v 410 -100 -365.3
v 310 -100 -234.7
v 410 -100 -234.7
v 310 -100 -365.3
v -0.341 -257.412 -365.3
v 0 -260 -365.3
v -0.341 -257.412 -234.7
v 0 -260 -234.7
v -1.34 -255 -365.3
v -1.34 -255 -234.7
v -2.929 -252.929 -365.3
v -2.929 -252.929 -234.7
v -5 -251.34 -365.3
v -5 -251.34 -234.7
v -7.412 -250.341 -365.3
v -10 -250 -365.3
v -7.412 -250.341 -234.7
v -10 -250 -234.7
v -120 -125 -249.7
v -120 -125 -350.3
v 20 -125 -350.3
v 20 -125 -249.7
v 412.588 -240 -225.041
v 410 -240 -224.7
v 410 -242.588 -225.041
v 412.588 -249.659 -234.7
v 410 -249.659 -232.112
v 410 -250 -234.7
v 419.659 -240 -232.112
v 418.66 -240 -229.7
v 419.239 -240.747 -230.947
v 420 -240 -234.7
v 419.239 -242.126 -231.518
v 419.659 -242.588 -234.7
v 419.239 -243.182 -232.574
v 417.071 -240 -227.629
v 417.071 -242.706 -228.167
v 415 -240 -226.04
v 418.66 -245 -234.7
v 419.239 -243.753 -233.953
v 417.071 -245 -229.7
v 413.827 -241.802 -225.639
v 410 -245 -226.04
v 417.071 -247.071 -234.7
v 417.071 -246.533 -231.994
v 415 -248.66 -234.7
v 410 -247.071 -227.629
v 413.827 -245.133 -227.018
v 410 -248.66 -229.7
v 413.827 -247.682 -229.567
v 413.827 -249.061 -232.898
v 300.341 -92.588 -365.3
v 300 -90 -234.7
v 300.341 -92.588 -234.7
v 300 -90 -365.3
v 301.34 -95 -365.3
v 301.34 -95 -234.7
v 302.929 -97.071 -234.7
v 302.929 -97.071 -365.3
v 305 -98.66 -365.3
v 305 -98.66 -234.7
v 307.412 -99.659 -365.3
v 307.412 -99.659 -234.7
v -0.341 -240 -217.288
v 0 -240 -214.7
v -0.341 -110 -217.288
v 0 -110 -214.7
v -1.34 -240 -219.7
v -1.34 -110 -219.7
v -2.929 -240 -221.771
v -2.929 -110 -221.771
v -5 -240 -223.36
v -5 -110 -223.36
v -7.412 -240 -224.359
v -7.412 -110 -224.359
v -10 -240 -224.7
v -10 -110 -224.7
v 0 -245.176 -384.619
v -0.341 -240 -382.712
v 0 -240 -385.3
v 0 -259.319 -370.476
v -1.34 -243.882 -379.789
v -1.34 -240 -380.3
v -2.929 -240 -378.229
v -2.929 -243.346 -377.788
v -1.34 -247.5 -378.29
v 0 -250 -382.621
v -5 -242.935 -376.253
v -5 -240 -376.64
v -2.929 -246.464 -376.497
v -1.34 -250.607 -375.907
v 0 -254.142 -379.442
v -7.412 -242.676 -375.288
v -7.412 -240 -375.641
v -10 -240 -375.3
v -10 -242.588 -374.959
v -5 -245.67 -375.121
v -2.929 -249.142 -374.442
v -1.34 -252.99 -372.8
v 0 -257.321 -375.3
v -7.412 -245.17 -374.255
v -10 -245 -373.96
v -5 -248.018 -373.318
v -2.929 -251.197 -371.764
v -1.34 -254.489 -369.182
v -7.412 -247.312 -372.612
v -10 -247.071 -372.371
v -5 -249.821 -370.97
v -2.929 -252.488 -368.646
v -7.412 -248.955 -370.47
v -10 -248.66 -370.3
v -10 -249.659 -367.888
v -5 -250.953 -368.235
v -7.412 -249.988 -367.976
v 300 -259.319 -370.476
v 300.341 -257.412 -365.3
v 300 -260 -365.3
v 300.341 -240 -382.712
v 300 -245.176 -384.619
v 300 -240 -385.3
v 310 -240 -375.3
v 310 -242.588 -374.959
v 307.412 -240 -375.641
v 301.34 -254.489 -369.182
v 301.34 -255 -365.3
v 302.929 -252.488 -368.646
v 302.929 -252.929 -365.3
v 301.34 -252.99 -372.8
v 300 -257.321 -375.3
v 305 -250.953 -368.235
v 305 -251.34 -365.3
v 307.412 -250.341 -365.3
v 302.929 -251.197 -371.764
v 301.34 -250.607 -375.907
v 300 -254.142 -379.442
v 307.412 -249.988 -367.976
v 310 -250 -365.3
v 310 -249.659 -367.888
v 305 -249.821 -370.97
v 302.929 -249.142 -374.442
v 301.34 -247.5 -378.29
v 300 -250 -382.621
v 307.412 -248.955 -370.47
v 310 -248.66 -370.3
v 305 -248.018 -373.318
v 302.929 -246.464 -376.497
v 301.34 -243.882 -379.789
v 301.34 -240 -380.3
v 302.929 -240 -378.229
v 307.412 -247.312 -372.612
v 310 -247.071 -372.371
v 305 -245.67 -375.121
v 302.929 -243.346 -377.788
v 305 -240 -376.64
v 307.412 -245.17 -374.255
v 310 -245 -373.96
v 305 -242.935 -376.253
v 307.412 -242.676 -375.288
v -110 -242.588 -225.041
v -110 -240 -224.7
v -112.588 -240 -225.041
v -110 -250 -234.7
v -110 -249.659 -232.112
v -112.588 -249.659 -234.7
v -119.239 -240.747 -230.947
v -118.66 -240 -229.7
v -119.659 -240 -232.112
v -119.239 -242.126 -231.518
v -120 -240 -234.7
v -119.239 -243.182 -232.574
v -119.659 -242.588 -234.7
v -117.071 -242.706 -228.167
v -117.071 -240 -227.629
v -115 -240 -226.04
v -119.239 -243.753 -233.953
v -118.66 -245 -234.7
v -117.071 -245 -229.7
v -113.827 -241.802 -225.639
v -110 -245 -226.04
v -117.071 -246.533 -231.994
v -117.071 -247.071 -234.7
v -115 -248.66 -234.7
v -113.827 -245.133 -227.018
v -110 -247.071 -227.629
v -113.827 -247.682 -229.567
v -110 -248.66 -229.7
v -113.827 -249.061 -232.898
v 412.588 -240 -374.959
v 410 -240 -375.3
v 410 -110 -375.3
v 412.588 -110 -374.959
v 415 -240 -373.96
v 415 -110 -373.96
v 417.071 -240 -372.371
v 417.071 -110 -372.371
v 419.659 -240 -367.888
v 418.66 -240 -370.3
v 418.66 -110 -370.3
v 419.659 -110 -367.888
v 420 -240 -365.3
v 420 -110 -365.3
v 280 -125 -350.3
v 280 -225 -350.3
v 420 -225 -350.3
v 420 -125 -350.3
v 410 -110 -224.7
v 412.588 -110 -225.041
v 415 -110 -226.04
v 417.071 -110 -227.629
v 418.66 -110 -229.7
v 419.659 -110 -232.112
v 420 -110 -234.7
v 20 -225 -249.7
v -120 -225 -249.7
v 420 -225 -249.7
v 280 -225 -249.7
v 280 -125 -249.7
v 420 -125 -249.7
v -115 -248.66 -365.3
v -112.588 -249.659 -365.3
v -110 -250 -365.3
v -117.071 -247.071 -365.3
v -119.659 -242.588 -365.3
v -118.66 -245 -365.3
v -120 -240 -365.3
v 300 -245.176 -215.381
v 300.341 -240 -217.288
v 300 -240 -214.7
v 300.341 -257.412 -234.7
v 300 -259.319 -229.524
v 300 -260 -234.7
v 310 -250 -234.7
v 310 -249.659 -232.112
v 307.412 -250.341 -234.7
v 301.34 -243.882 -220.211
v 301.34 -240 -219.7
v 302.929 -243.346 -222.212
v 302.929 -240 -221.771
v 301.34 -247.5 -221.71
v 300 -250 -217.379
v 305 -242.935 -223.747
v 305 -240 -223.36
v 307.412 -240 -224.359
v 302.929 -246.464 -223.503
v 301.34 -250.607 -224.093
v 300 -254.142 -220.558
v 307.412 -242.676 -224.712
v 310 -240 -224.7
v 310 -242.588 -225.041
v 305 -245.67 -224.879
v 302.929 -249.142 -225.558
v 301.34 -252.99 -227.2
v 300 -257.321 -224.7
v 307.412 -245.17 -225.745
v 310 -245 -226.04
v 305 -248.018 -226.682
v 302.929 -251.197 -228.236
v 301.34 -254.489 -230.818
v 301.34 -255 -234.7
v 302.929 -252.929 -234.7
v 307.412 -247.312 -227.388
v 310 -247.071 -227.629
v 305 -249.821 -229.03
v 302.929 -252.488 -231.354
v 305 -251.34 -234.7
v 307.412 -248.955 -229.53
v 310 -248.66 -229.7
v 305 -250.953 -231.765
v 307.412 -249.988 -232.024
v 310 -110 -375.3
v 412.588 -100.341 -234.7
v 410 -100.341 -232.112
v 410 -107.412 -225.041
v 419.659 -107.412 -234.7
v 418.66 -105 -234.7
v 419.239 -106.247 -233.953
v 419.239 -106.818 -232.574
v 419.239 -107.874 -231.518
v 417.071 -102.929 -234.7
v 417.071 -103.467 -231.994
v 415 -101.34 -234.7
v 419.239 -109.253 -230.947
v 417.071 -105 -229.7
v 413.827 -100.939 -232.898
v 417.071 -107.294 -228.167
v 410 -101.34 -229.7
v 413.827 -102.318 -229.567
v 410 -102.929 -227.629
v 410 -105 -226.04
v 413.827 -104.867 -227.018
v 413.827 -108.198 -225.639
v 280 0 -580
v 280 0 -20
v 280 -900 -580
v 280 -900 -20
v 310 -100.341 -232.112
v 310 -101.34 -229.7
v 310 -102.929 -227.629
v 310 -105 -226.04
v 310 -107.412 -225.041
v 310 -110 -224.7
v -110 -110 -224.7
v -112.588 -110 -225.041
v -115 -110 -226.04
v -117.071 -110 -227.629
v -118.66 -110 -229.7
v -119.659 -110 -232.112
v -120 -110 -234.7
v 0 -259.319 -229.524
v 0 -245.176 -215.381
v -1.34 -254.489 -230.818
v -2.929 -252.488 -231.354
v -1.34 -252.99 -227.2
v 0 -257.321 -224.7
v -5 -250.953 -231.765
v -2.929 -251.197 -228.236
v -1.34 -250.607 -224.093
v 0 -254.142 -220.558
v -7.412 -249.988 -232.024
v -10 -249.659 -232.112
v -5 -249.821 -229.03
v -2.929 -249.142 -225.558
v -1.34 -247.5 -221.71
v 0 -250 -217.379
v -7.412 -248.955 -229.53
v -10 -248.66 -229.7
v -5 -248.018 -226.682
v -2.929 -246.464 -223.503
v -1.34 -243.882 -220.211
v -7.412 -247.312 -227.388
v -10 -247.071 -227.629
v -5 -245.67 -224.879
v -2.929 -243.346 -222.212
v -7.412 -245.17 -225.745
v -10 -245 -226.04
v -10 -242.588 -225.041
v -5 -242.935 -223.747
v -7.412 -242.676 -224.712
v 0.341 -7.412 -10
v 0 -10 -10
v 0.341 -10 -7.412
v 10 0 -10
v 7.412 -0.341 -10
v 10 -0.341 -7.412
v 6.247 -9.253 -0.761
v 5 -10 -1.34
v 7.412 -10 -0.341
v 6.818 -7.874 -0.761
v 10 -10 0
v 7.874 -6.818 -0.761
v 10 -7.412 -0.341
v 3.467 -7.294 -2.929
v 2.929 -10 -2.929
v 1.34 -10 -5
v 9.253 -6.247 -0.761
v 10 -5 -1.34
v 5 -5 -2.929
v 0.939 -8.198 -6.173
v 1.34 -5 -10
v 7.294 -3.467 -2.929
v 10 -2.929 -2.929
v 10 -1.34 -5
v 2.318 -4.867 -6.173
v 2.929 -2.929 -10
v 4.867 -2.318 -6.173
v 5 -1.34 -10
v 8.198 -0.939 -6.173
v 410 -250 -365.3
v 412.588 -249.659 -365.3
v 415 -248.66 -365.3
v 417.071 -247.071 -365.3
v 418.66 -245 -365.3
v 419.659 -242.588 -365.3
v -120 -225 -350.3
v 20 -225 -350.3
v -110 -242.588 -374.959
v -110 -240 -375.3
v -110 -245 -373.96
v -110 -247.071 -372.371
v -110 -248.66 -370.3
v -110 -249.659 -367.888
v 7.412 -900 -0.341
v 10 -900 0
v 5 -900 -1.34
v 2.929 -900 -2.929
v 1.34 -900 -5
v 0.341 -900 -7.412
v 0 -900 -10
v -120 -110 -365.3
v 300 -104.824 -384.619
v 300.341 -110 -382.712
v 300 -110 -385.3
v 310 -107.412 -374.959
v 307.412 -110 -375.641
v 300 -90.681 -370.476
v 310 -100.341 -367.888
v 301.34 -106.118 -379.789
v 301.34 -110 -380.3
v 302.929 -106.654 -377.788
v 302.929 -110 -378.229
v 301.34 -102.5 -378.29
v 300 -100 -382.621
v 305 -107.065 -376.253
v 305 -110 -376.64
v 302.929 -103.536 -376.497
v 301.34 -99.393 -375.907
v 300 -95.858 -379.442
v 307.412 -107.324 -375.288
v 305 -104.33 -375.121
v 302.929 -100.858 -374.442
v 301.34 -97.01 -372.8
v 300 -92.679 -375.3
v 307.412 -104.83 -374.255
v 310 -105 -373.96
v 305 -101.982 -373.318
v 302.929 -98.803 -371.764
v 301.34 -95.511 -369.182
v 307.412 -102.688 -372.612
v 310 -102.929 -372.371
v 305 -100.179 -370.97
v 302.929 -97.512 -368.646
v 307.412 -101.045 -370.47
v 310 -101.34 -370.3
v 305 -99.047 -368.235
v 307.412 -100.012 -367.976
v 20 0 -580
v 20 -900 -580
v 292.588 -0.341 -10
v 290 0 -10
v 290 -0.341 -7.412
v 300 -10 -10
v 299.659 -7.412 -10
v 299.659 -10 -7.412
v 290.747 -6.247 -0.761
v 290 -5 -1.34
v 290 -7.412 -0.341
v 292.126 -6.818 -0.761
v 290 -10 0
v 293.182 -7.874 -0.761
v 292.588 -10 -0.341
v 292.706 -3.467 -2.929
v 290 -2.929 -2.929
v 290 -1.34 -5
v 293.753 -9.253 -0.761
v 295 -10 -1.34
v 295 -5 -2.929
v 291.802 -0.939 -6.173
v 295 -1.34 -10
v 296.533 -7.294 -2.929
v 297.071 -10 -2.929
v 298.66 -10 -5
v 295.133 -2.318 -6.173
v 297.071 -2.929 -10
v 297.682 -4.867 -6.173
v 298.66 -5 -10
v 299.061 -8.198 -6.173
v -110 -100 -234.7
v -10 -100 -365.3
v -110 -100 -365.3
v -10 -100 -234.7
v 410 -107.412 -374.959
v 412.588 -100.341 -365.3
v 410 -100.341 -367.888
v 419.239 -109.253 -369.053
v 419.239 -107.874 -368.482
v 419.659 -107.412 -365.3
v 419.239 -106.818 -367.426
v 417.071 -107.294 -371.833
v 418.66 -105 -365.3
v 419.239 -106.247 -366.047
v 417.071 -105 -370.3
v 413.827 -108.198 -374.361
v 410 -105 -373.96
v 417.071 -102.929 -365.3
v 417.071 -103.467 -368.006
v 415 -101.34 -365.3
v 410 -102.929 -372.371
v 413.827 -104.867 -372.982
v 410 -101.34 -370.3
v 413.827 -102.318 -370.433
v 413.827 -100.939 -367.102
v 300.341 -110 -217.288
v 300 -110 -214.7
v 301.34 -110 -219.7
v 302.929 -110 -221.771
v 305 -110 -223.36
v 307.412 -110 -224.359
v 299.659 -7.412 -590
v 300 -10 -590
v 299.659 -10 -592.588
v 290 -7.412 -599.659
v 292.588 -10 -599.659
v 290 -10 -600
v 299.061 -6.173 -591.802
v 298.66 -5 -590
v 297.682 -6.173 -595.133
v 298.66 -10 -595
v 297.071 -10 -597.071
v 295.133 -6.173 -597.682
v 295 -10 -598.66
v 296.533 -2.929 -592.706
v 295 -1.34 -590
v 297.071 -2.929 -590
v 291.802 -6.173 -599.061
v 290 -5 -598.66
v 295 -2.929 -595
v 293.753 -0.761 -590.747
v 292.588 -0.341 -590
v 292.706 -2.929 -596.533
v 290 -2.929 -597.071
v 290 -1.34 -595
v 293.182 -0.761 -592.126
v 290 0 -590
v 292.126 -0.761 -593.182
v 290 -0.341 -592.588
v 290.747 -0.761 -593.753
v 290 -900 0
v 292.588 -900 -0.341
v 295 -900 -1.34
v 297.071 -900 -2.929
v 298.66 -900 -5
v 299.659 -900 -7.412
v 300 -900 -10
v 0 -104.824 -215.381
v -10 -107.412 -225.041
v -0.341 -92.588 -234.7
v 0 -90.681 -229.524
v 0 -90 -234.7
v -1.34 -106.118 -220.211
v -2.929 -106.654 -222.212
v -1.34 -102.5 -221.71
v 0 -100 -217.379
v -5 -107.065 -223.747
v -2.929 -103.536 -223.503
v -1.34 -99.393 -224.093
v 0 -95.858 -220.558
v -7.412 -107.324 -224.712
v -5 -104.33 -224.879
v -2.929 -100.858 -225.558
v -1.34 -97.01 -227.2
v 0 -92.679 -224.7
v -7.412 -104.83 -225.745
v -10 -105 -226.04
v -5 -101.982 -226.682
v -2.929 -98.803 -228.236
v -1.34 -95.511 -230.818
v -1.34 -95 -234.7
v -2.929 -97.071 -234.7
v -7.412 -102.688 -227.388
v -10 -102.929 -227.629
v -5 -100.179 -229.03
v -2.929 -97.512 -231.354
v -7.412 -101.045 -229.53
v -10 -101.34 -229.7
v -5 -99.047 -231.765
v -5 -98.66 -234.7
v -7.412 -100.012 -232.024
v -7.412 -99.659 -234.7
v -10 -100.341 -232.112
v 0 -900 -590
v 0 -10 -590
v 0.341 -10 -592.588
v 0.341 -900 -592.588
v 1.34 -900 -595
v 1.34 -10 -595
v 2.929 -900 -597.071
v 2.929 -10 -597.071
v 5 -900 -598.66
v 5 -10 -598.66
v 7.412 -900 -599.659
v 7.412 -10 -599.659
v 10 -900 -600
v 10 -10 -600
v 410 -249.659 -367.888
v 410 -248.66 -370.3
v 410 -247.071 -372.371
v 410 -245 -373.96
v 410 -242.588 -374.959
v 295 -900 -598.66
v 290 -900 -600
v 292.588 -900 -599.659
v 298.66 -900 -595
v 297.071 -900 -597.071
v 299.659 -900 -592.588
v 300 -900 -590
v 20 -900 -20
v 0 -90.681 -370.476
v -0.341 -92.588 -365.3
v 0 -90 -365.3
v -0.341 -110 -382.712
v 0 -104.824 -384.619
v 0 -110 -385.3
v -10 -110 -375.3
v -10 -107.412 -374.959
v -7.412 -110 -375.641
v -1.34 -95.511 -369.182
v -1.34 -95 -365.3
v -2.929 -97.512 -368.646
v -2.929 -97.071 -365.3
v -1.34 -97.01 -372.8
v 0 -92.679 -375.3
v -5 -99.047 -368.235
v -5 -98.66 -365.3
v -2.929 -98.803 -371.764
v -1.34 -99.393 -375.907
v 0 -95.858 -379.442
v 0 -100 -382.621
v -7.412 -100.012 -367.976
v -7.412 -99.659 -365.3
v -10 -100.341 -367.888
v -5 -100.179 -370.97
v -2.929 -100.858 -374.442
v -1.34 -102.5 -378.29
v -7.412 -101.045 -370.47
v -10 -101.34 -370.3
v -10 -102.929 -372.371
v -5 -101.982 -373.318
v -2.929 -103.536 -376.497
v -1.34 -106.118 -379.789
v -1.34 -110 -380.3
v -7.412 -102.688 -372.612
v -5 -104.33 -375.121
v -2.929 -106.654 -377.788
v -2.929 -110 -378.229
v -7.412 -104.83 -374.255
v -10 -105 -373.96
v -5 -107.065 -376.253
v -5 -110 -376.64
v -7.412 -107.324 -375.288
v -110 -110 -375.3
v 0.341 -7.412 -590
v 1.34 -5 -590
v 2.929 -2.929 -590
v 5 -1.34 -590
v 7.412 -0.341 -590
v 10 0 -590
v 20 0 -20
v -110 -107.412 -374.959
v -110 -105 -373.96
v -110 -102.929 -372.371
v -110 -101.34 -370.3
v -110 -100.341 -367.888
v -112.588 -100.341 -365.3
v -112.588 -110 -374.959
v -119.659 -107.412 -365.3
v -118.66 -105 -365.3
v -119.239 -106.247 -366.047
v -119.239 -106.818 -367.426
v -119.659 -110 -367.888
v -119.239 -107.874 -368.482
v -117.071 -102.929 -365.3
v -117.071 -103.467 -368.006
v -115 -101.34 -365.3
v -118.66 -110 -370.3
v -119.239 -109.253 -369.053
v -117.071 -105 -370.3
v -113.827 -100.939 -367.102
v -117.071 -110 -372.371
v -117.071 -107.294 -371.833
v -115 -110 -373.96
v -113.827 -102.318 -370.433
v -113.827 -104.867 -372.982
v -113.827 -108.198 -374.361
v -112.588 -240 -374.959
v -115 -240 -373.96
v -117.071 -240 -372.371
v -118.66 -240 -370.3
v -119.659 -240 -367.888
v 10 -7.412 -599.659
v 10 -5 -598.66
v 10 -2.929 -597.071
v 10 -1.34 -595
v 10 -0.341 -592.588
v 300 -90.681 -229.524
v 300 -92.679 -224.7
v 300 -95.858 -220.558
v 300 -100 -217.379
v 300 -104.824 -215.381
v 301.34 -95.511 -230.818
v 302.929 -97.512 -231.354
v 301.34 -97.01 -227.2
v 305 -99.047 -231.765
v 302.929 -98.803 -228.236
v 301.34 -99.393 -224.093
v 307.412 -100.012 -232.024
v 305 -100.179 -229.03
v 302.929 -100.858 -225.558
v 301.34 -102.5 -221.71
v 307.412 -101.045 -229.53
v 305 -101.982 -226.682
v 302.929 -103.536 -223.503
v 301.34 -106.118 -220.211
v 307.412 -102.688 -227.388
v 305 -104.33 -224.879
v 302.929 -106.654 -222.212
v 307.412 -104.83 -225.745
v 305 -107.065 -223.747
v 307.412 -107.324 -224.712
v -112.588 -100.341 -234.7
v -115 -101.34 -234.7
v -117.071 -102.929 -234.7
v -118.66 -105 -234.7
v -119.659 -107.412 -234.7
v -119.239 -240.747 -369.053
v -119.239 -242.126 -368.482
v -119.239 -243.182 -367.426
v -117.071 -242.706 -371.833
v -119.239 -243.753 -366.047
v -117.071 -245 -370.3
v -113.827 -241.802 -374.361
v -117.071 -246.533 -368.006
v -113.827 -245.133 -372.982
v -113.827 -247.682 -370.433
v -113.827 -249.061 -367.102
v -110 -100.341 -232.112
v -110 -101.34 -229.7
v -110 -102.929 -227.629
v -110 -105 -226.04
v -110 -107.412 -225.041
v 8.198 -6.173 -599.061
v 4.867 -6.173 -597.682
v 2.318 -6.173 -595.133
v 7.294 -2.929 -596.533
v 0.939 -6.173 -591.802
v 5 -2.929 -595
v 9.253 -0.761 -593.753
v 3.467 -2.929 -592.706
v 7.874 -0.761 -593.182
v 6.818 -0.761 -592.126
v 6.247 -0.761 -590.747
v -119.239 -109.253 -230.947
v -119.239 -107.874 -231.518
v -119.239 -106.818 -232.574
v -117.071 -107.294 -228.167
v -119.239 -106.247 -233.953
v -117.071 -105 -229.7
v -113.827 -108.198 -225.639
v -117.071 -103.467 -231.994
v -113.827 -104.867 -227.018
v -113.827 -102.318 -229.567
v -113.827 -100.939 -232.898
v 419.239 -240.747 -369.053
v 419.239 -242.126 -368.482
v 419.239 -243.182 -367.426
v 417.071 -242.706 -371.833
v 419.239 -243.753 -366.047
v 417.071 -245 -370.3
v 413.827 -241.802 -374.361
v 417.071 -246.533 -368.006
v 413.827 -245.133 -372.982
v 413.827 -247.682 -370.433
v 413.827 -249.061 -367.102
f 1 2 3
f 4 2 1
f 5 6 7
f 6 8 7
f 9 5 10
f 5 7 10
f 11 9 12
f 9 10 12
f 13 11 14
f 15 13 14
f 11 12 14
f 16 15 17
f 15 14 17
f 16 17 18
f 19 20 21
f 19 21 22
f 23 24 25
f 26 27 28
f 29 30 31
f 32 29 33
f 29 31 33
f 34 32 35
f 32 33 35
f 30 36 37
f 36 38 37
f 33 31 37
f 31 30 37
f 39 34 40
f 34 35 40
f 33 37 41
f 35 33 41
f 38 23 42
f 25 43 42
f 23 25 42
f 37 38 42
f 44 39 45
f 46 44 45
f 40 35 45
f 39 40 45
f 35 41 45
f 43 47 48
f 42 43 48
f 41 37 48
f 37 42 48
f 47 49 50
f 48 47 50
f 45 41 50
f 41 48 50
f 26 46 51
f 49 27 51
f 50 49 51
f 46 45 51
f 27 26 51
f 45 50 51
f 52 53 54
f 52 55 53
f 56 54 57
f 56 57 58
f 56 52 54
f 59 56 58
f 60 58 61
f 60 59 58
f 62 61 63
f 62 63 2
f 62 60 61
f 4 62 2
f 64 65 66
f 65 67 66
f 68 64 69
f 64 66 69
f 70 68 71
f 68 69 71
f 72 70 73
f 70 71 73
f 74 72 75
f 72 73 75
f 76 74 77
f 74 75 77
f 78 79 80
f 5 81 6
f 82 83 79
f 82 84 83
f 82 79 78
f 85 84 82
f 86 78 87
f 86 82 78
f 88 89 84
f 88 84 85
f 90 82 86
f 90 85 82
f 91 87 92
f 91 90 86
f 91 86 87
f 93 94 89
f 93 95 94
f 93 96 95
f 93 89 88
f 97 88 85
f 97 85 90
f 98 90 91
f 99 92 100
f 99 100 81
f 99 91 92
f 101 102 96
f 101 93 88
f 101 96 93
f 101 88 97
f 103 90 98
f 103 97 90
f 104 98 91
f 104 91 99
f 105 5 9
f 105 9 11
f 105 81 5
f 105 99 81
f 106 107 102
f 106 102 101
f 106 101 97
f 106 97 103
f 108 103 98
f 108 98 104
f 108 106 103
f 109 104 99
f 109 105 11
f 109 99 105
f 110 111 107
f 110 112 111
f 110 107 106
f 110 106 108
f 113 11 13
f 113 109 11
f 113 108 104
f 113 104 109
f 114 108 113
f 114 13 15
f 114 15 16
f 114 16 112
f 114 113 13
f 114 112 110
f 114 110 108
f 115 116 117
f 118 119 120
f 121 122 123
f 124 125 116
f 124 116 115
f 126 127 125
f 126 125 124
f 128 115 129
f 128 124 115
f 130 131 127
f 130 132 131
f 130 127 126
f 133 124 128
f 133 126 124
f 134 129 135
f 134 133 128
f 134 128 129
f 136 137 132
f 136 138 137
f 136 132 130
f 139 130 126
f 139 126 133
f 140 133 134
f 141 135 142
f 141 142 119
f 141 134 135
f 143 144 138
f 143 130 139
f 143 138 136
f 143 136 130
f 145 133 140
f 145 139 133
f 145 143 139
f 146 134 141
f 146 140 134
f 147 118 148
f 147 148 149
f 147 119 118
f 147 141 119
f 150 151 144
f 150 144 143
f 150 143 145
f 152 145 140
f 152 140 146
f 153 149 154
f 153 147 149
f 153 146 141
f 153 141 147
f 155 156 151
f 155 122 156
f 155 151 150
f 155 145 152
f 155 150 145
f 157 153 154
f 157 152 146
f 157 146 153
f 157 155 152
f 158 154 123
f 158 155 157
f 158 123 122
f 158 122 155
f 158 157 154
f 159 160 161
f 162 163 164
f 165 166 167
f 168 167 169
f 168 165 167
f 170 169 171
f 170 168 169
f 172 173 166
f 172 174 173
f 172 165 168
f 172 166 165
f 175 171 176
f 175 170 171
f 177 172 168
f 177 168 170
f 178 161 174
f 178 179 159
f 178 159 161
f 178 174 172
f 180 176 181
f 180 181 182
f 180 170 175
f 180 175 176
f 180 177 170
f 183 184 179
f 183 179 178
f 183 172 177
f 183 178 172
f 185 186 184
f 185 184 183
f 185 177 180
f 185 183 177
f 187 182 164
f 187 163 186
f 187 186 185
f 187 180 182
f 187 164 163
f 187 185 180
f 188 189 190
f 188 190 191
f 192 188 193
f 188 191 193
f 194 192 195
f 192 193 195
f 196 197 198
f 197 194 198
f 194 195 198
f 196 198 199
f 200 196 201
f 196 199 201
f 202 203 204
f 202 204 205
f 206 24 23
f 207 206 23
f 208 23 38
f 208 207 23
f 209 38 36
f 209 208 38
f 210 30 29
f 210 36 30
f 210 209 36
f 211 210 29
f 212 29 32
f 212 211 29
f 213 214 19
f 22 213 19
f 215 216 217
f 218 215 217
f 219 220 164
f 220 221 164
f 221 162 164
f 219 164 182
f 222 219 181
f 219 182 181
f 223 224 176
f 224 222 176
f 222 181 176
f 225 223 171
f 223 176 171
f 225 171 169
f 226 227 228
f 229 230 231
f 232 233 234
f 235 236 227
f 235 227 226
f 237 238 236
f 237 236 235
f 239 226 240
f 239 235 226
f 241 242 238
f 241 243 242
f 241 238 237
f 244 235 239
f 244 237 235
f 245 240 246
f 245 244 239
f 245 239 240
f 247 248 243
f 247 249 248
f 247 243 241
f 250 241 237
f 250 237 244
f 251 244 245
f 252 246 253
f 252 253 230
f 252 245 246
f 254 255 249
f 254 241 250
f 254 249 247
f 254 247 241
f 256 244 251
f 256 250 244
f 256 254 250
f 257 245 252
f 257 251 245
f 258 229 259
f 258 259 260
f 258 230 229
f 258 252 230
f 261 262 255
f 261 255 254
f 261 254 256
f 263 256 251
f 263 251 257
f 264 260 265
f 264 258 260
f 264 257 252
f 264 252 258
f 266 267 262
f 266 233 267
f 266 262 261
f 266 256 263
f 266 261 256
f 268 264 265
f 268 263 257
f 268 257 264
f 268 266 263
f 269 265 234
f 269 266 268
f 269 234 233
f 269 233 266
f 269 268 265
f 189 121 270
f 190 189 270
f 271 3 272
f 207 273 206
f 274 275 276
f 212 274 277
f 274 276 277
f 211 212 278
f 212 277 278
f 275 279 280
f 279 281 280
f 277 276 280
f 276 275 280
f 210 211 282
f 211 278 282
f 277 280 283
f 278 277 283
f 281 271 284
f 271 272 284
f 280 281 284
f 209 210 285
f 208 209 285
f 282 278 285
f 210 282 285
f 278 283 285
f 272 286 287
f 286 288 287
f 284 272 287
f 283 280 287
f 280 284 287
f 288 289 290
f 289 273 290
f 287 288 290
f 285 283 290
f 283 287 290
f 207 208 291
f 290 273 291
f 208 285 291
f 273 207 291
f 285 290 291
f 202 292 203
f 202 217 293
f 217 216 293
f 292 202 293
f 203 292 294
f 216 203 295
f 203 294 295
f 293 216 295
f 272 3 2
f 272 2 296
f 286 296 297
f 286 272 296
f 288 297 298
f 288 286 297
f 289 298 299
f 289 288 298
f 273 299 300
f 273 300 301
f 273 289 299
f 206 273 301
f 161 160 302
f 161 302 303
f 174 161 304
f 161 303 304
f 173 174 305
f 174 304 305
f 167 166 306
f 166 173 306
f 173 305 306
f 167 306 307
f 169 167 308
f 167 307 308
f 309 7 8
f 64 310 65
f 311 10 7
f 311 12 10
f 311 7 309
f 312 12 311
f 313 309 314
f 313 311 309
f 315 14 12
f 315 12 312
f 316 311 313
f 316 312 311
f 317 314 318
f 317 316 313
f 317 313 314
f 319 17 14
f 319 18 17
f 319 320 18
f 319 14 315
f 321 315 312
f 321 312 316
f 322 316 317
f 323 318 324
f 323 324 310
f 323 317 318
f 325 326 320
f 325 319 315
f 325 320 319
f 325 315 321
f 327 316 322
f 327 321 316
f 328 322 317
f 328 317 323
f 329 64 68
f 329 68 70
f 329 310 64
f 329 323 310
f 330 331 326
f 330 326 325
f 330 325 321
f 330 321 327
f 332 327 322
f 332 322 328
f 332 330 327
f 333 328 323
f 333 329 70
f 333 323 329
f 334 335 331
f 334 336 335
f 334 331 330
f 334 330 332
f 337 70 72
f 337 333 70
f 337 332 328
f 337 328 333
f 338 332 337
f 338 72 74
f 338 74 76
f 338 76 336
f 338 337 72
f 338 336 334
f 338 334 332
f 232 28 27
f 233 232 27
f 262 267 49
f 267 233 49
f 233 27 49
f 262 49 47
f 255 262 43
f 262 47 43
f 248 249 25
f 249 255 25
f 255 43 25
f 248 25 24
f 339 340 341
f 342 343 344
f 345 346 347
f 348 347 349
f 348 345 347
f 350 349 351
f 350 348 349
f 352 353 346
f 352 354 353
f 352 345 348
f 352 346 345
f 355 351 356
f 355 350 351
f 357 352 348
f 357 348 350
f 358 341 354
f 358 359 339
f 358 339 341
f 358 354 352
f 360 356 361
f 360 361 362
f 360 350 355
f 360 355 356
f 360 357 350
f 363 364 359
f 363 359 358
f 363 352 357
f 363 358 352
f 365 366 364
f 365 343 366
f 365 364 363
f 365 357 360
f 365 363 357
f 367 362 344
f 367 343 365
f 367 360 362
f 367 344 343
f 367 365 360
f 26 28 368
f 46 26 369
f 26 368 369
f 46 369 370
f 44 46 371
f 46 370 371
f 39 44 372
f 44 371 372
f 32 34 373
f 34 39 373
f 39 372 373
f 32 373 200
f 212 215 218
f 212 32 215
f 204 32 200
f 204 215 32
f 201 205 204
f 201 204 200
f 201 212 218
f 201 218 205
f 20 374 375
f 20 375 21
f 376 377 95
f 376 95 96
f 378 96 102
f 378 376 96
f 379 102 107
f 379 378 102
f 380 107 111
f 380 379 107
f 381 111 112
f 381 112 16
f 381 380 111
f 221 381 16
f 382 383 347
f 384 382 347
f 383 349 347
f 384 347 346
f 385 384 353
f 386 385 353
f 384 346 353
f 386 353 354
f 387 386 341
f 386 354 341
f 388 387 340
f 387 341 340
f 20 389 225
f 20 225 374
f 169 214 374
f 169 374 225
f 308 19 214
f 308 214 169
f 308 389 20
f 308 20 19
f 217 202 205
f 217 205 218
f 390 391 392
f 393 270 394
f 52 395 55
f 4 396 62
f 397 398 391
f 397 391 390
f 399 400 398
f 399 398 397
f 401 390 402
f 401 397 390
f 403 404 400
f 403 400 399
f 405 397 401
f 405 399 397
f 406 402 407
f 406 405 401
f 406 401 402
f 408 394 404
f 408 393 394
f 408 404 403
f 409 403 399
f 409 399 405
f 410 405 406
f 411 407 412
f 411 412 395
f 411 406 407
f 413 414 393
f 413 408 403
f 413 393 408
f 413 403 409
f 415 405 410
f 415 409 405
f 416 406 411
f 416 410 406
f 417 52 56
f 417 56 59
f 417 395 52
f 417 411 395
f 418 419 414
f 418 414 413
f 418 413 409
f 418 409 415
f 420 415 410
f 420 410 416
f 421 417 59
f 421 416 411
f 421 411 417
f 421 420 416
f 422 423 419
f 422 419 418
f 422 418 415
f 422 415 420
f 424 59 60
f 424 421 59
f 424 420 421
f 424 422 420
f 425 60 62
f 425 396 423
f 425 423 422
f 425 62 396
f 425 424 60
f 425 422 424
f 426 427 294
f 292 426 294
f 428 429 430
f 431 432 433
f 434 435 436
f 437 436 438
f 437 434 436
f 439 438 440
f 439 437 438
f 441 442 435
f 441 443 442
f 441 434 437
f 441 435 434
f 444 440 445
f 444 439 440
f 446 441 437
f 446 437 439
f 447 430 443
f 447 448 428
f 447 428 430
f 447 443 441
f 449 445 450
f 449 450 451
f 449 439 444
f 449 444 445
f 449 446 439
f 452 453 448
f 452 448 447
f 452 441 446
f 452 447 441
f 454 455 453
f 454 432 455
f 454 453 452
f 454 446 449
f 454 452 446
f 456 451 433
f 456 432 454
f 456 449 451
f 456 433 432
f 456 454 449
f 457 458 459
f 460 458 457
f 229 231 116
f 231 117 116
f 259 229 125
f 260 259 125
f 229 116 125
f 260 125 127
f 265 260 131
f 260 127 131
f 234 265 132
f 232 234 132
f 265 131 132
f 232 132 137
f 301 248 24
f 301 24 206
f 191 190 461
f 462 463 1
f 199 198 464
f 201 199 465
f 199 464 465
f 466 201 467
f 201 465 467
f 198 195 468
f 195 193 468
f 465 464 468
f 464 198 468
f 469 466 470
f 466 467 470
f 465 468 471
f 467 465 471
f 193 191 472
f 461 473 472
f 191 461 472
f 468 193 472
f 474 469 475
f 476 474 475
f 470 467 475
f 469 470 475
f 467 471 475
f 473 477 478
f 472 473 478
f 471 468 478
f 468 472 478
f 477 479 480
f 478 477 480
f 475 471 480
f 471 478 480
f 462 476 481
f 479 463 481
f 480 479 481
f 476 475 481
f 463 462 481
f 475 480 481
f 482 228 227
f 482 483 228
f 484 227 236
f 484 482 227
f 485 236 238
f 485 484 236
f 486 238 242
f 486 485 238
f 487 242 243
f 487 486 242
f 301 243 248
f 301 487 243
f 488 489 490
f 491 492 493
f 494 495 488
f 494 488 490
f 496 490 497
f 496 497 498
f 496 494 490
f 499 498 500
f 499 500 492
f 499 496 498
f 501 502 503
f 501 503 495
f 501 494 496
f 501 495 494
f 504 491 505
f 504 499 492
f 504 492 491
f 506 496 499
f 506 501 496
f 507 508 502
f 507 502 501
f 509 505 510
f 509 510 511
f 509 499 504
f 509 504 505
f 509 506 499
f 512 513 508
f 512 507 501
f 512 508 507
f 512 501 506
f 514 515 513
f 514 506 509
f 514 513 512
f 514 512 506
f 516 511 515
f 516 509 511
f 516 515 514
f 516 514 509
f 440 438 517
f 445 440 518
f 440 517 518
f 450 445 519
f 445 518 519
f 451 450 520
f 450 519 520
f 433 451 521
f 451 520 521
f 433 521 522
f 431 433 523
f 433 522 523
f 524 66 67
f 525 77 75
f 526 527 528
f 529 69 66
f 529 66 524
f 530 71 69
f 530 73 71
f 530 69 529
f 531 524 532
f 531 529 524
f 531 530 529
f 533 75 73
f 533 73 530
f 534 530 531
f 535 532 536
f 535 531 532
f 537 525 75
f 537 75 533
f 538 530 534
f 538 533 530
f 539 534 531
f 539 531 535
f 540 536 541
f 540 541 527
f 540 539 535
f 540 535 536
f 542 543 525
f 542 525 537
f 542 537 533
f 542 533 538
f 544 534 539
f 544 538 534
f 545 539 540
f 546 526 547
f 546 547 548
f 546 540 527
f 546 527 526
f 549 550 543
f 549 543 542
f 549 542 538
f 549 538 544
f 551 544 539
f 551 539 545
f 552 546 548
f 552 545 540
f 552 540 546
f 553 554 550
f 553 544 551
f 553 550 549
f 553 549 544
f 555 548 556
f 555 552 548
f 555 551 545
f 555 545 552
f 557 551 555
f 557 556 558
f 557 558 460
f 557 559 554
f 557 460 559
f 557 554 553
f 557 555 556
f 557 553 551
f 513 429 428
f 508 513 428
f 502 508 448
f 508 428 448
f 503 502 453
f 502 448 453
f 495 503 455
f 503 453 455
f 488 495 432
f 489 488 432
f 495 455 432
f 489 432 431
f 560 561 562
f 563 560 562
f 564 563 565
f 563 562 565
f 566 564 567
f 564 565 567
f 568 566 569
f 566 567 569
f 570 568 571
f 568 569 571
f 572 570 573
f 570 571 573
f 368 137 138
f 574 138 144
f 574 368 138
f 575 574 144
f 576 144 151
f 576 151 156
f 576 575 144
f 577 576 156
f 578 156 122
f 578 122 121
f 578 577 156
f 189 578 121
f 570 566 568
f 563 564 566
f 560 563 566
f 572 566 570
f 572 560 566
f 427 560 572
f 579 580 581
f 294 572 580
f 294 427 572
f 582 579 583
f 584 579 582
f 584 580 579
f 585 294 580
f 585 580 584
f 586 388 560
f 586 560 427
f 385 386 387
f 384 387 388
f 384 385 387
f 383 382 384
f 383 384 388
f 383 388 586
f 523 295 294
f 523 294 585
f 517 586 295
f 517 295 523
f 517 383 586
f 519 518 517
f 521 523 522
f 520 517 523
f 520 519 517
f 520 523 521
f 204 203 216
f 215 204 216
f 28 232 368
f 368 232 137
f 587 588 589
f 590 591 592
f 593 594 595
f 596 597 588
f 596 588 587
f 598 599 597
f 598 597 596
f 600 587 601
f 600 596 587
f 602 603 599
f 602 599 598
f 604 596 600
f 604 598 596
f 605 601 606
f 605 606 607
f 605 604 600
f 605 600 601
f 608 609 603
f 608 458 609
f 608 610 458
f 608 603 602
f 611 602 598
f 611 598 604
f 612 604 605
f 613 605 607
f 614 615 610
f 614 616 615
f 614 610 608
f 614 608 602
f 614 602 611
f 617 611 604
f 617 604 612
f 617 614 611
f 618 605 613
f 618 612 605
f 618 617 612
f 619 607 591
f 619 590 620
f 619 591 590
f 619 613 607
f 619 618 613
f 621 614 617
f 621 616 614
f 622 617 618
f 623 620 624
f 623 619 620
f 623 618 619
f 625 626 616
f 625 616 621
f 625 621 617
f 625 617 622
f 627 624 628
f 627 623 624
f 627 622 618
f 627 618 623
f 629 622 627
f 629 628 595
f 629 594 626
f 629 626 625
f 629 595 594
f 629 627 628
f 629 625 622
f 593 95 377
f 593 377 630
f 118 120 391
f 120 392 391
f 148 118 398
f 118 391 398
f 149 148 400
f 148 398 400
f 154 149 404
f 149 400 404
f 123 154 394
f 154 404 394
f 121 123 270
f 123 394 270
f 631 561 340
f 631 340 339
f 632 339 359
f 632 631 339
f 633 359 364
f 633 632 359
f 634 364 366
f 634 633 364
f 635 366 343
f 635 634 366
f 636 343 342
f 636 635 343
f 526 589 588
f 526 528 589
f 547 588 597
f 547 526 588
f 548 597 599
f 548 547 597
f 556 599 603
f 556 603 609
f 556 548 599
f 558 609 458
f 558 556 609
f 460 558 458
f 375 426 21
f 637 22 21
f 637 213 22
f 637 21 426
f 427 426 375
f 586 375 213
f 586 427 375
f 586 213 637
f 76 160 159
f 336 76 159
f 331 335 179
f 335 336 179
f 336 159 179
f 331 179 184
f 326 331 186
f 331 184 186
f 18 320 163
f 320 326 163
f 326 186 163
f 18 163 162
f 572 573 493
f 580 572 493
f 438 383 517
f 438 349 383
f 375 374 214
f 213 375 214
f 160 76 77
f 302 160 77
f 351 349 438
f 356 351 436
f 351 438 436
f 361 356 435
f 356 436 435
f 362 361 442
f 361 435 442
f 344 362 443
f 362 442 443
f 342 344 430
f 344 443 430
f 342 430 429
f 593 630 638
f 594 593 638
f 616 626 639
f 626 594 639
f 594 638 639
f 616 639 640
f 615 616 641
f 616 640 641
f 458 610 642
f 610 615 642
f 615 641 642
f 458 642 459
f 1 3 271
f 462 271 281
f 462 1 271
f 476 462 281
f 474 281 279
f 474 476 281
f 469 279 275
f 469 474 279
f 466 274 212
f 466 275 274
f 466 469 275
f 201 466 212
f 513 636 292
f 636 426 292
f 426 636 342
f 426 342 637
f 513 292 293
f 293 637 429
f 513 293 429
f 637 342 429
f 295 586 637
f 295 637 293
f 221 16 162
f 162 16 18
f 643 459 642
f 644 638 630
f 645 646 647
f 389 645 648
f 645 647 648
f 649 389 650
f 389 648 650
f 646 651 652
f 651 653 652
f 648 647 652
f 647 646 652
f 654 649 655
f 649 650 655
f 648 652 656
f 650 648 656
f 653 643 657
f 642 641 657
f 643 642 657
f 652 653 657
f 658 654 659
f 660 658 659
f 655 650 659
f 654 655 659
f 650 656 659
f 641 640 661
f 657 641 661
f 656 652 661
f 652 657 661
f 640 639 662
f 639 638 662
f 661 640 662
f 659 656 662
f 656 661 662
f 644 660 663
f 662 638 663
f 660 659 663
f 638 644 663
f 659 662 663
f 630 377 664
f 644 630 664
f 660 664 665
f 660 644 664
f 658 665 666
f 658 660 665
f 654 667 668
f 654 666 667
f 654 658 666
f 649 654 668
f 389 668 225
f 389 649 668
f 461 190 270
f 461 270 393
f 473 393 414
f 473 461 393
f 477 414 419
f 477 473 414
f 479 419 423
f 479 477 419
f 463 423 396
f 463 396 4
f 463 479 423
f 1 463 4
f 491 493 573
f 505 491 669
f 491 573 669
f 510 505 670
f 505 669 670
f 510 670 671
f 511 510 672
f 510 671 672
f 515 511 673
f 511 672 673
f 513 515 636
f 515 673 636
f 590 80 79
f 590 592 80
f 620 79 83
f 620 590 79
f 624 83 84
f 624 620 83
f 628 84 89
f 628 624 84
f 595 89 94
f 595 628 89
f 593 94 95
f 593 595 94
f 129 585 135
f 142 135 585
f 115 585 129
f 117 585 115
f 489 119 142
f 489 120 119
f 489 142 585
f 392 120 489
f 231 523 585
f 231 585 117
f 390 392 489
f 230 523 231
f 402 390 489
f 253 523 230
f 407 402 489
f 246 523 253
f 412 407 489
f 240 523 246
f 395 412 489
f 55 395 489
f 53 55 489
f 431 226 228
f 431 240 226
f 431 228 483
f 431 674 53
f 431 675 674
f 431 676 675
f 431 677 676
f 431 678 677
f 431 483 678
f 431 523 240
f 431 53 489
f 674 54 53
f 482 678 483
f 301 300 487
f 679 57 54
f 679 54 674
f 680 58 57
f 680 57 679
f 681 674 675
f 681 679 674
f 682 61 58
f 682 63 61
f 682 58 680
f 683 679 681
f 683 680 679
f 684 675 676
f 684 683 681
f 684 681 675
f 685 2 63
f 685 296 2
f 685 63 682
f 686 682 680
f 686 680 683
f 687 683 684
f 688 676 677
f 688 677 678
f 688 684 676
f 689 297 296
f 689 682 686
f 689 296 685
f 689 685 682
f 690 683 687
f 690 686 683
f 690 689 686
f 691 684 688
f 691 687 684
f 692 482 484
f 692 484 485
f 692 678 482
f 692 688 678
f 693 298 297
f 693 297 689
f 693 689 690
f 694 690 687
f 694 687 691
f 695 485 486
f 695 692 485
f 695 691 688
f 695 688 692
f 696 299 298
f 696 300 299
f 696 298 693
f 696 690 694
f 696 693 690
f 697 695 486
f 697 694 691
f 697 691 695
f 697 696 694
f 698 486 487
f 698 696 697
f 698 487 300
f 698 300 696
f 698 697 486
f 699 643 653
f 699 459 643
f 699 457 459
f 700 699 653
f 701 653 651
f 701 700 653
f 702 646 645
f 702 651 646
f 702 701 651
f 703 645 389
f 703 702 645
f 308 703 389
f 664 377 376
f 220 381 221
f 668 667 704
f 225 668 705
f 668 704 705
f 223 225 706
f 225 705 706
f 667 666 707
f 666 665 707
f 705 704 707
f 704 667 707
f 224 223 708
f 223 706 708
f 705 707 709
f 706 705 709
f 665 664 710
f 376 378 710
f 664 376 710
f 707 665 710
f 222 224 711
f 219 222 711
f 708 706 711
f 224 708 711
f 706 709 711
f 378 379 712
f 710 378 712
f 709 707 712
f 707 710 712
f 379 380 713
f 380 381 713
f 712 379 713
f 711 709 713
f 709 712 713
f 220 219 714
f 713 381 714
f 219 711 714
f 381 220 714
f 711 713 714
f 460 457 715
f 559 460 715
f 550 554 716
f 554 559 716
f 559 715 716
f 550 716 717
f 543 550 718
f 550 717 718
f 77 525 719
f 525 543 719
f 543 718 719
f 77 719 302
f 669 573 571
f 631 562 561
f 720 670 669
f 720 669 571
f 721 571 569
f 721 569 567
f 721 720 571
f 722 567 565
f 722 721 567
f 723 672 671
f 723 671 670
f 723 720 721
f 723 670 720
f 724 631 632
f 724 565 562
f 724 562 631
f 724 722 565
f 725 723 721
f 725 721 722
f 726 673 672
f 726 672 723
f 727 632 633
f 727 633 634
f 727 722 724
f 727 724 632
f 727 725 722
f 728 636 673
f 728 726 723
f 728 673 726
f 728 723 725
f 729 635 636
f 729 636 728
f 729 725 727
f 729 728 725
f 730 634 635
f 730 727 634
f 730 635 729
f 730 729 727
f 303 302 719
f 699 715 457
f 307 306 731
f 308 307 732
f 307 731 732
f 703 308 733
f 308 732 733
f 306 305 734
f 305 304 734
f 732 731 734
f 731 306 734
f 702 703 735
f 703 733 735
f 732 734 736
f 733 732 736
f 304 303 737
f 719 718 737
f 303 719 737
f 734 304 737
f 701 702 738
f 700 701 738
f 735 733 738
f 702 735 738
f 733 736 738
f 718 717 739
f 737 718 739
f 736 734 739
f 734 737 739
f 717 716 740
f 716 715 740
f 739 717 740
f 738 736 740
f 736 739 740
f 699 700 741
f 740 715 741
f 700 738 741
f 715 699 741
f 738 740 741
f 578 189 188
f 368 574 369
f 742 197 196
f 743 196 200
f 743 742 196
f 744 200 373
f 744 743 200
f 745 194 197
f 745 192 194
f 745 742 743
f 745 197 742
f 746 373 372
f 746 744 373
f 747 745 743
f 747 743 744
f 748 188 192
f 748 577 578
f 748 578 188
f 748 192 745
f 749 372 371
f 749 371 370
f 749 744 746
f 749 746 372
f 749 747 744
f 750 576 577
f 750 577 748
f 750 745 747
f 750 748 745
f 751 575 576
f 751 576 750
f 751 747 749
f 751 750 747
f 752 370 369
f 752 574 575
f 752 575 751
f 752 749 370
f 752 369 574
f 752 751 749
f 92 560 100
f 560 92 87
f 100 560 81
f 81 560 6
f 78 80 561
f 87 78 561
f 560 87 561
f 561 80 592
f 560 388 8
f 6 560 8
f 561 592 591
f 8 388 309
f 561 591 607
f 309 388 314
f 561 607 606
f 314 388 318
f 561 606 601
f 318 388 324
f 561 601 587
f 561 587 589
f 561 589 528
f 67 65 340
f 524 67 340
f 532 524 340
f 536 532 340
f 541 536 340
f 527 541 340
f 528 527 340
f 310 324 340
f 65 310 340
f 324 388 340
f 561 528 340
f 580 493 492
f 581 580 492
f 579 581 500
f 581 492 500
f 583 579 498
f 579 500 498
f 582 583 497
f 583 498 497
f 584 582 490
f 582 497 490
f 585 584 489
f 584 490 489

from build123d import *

# Parameters (mm, degrees)
SKETCH1_W           = 300
SKETCH1_H           = 900
BOSS_EXTRUDE1_DEPTH = 600
SKETCH4_W           = 150.6
SKETCH4_H           = 150
BOSS_EXTRUDE3_DEPTH = 120
SKETCH6_W           = 150.6
SKETCH6_H           = 150
BOSS_EXTRUDE4_DEPTH = 120
FILLET1_R           = 10
FILLET2_R           = 10
FILLET3_R           = 10
FILLET5_R           = 10
FILLET6_R           = 10
SKETCH8_W           = 260
SKETCH8_H           = 560
CUT_EXTRUDE1_DEPTH  = 1161.344776349
SKETCH7_W           = 100.6
SKETCH7_H           = 100
CUT_EXTRUDE2_DEPTH  = 1209.966500777


with BuildPart() as part:
    # Sketch1 → Boss-Extrude1 (new body)
    with BuildSketch(Plane.XY):
        with Locations((150, -450)):
            Rectangle(SKETCH1_W, SKETCH1_H)
    extrude(amount=-BOSS_EXTRUDE1_DEPTH)

    # Sketch4 → Boss-Extrude3 (add)
    with BuildSketch(Plane(origin=(300, 0, 0), x_dir=(0, 0, -1), z_dir=(1, 0, 0))):
        with Locations((300, -175)):
            Rectangle(SKETCH4_W, SKETCH4_H)
    extrude(amount=BOSS_EXTRUDE3_DEPTH)

    # Sketch6 → Boss-Extrude4 (add)
    with BuildSketch(Plane.ZY):
        with Locations((-300, -175)):
            Rectangle(SKETCH6_W, SKETCH6_H)
    extrude(amount=BOSS_EXTRUDE4_DEPTH)

    # Fillet1
    fillet1_edges = [part.edges().sort_by_distance(p)[0] for p in [
        (300, -450, -600),
        (0, -450, -600),
        (0, 0, -300),
    ]]
    fillet(fillet1_edges, radius=FILLET1_R)

    # Fillet2
    fillet2_edges = [part.edges().sort_by_distance(p)[0] for p in [
        (0, -175, -224.7),
        (-60, -250, -224.7),
        (0, -100, -300),
        (-60, -100, -224.7),
        (0, -175, -375.3),
        (-60, -100, -375.3),
        (0, -250, -300),
        (-60, -250, -375.3),
        (-120, -175, -224.7),
        (-120, -100, -300),
        (-120, -175, -375.3),
        (-120, -250, -300),
    ]]
    fillet(fillet2_edges, radius=FILLET2_R)

    # Fillet3
    fillet3_edges = [part.edges().sort_by_distance(p)[0] for p in [
        (300, -175, -375.3),
        (360, -250, -375.3),
        (300, -100, -300),
        (360, -100, -375.3),
        (300, -175, -224.7),
        (360, -100, -224.7),
        (300, -250, -300),
        (360, -250, -224.7),
        (420, -175, -375.3),
        (420, -100, -300),
        (420, -175, -224.7),
        (420, -250, -300),
    ]]
    fillet(fillet3_edges, radius=FILLET3_R)

    # Fillet5
    # the kernel refuses this fillet: 10 mm, written as the material it takes off along each edge
    with BuildSketch(Plane(origin=(10, -10, -590), x_dir=(0, 0, -1), z_dir=(0, 1, 0))) as fillet5_piece_1_section:
        Polygon((0, 0), (FILLET5_R, 0), (FILLET5_R, FILLET5_R), (0, FILLET5_R), align=None)
    fillet5_piece_1 = extrude(amount=FILLET5_R, mode=Mode.PRIVATE)
    fillet5_piece_1 = fillet5_piece_1 - Plane(origin=(10, -10, -590), x_dir=(0.7071067811865475, 0, 0.7071067811865475), z_dir=(0, 1, 0)) * Sphere(FILLET5_R, mode=Mode.PRIVATE)
    add(fillet5_piece_1, mode=Mode.SUBTRACT)
    with BuildSketch(Plane(origin=(300, 0, 25), x_dir=(0, -1, 0), z_dir=(0, 0, -1))) as fillet5_piece_2:
        with BuildLine():
            CenterArc((FILLET5_R, FILLET5_R), FILLET5_R, 180, 90)
            Line((0, FILLET5_R), (0, 0))
            Line((0, 0), (FILLET5_R, 0))
        make_face()
    extrude(amount=615, mode=Mode.SUBTRACT)
    with BuildSketch(Plane(origin=(10, 0, -600), x_dir=(0, 0, 1), z_dir=(1, 0, 0))) as fillet5_piece_3:
        with BuildLine():
            CenterArc((FILLET5_R, FILLET5_R), FILLET5_R, 180, 90)
            Line((0, FILLET5_R), (0, 0))
            Line((0, 0), (FILLET5_R, 0))
        make_face()
    extrude(amount=280, mode=Mode.SUBTRACT)
    with BuildSketch(Plane(origin=(290, 0, -590), x_dir=(1, 0, 0), z_dir=(0, 0, 1))) as fillet5_piece_4:
        with BuildLine():
            CenterArc((10 - FILLET5_R, -FILLET5_R), FILLET5_R, 0, 90)
            Line((10, -FILLET5_R), (10, 0))
            Line((10, 0), (10 - FILLET5_R, 0))
        make_face()
    revolve(axis=Axis((290, 0, -590), (0, 1, 0)), revolution_arc=90, mode=Mode.SUBTRACT)

    # Fillet6
    fillet6_edges = [part.edges().sort_by_distance(p)[0] for p in [
        (150, 0, 0),
        (297.071067812, -2.928932188, 0),
        (0, -455, 0),
        (2.928932188, -2.928932188, 0),
        (300, -455, 0),
    ]]
    fillet(fillet6_edges, radius=FILLET6_R)

    # Sketch8 → Cut-Extrude1 (cut, through all)
    with BuildSketch(Plane.XZ.offset(900)):
        with Locations((150, -300)):
            Rectangle(SKETCH8_W, SKETCH8_H)
    extrude(amount=-CUT_EXTRUDE1_DEPTH, mode=Mode.SUBTRACT)

    # Sketch7 → Cut-Extrude2 (cut, through all)
    with BuildSketch(Plane.ZY.offset(120)):
        with Locations((-300, -175)):
            Rectangle(SKETCH7_W, SKETCH7_H)
    extrude(amount=-CUT_EXTRUDE2_DEPTH, mode=Mode.SUBTRACT)


solid = part.part
